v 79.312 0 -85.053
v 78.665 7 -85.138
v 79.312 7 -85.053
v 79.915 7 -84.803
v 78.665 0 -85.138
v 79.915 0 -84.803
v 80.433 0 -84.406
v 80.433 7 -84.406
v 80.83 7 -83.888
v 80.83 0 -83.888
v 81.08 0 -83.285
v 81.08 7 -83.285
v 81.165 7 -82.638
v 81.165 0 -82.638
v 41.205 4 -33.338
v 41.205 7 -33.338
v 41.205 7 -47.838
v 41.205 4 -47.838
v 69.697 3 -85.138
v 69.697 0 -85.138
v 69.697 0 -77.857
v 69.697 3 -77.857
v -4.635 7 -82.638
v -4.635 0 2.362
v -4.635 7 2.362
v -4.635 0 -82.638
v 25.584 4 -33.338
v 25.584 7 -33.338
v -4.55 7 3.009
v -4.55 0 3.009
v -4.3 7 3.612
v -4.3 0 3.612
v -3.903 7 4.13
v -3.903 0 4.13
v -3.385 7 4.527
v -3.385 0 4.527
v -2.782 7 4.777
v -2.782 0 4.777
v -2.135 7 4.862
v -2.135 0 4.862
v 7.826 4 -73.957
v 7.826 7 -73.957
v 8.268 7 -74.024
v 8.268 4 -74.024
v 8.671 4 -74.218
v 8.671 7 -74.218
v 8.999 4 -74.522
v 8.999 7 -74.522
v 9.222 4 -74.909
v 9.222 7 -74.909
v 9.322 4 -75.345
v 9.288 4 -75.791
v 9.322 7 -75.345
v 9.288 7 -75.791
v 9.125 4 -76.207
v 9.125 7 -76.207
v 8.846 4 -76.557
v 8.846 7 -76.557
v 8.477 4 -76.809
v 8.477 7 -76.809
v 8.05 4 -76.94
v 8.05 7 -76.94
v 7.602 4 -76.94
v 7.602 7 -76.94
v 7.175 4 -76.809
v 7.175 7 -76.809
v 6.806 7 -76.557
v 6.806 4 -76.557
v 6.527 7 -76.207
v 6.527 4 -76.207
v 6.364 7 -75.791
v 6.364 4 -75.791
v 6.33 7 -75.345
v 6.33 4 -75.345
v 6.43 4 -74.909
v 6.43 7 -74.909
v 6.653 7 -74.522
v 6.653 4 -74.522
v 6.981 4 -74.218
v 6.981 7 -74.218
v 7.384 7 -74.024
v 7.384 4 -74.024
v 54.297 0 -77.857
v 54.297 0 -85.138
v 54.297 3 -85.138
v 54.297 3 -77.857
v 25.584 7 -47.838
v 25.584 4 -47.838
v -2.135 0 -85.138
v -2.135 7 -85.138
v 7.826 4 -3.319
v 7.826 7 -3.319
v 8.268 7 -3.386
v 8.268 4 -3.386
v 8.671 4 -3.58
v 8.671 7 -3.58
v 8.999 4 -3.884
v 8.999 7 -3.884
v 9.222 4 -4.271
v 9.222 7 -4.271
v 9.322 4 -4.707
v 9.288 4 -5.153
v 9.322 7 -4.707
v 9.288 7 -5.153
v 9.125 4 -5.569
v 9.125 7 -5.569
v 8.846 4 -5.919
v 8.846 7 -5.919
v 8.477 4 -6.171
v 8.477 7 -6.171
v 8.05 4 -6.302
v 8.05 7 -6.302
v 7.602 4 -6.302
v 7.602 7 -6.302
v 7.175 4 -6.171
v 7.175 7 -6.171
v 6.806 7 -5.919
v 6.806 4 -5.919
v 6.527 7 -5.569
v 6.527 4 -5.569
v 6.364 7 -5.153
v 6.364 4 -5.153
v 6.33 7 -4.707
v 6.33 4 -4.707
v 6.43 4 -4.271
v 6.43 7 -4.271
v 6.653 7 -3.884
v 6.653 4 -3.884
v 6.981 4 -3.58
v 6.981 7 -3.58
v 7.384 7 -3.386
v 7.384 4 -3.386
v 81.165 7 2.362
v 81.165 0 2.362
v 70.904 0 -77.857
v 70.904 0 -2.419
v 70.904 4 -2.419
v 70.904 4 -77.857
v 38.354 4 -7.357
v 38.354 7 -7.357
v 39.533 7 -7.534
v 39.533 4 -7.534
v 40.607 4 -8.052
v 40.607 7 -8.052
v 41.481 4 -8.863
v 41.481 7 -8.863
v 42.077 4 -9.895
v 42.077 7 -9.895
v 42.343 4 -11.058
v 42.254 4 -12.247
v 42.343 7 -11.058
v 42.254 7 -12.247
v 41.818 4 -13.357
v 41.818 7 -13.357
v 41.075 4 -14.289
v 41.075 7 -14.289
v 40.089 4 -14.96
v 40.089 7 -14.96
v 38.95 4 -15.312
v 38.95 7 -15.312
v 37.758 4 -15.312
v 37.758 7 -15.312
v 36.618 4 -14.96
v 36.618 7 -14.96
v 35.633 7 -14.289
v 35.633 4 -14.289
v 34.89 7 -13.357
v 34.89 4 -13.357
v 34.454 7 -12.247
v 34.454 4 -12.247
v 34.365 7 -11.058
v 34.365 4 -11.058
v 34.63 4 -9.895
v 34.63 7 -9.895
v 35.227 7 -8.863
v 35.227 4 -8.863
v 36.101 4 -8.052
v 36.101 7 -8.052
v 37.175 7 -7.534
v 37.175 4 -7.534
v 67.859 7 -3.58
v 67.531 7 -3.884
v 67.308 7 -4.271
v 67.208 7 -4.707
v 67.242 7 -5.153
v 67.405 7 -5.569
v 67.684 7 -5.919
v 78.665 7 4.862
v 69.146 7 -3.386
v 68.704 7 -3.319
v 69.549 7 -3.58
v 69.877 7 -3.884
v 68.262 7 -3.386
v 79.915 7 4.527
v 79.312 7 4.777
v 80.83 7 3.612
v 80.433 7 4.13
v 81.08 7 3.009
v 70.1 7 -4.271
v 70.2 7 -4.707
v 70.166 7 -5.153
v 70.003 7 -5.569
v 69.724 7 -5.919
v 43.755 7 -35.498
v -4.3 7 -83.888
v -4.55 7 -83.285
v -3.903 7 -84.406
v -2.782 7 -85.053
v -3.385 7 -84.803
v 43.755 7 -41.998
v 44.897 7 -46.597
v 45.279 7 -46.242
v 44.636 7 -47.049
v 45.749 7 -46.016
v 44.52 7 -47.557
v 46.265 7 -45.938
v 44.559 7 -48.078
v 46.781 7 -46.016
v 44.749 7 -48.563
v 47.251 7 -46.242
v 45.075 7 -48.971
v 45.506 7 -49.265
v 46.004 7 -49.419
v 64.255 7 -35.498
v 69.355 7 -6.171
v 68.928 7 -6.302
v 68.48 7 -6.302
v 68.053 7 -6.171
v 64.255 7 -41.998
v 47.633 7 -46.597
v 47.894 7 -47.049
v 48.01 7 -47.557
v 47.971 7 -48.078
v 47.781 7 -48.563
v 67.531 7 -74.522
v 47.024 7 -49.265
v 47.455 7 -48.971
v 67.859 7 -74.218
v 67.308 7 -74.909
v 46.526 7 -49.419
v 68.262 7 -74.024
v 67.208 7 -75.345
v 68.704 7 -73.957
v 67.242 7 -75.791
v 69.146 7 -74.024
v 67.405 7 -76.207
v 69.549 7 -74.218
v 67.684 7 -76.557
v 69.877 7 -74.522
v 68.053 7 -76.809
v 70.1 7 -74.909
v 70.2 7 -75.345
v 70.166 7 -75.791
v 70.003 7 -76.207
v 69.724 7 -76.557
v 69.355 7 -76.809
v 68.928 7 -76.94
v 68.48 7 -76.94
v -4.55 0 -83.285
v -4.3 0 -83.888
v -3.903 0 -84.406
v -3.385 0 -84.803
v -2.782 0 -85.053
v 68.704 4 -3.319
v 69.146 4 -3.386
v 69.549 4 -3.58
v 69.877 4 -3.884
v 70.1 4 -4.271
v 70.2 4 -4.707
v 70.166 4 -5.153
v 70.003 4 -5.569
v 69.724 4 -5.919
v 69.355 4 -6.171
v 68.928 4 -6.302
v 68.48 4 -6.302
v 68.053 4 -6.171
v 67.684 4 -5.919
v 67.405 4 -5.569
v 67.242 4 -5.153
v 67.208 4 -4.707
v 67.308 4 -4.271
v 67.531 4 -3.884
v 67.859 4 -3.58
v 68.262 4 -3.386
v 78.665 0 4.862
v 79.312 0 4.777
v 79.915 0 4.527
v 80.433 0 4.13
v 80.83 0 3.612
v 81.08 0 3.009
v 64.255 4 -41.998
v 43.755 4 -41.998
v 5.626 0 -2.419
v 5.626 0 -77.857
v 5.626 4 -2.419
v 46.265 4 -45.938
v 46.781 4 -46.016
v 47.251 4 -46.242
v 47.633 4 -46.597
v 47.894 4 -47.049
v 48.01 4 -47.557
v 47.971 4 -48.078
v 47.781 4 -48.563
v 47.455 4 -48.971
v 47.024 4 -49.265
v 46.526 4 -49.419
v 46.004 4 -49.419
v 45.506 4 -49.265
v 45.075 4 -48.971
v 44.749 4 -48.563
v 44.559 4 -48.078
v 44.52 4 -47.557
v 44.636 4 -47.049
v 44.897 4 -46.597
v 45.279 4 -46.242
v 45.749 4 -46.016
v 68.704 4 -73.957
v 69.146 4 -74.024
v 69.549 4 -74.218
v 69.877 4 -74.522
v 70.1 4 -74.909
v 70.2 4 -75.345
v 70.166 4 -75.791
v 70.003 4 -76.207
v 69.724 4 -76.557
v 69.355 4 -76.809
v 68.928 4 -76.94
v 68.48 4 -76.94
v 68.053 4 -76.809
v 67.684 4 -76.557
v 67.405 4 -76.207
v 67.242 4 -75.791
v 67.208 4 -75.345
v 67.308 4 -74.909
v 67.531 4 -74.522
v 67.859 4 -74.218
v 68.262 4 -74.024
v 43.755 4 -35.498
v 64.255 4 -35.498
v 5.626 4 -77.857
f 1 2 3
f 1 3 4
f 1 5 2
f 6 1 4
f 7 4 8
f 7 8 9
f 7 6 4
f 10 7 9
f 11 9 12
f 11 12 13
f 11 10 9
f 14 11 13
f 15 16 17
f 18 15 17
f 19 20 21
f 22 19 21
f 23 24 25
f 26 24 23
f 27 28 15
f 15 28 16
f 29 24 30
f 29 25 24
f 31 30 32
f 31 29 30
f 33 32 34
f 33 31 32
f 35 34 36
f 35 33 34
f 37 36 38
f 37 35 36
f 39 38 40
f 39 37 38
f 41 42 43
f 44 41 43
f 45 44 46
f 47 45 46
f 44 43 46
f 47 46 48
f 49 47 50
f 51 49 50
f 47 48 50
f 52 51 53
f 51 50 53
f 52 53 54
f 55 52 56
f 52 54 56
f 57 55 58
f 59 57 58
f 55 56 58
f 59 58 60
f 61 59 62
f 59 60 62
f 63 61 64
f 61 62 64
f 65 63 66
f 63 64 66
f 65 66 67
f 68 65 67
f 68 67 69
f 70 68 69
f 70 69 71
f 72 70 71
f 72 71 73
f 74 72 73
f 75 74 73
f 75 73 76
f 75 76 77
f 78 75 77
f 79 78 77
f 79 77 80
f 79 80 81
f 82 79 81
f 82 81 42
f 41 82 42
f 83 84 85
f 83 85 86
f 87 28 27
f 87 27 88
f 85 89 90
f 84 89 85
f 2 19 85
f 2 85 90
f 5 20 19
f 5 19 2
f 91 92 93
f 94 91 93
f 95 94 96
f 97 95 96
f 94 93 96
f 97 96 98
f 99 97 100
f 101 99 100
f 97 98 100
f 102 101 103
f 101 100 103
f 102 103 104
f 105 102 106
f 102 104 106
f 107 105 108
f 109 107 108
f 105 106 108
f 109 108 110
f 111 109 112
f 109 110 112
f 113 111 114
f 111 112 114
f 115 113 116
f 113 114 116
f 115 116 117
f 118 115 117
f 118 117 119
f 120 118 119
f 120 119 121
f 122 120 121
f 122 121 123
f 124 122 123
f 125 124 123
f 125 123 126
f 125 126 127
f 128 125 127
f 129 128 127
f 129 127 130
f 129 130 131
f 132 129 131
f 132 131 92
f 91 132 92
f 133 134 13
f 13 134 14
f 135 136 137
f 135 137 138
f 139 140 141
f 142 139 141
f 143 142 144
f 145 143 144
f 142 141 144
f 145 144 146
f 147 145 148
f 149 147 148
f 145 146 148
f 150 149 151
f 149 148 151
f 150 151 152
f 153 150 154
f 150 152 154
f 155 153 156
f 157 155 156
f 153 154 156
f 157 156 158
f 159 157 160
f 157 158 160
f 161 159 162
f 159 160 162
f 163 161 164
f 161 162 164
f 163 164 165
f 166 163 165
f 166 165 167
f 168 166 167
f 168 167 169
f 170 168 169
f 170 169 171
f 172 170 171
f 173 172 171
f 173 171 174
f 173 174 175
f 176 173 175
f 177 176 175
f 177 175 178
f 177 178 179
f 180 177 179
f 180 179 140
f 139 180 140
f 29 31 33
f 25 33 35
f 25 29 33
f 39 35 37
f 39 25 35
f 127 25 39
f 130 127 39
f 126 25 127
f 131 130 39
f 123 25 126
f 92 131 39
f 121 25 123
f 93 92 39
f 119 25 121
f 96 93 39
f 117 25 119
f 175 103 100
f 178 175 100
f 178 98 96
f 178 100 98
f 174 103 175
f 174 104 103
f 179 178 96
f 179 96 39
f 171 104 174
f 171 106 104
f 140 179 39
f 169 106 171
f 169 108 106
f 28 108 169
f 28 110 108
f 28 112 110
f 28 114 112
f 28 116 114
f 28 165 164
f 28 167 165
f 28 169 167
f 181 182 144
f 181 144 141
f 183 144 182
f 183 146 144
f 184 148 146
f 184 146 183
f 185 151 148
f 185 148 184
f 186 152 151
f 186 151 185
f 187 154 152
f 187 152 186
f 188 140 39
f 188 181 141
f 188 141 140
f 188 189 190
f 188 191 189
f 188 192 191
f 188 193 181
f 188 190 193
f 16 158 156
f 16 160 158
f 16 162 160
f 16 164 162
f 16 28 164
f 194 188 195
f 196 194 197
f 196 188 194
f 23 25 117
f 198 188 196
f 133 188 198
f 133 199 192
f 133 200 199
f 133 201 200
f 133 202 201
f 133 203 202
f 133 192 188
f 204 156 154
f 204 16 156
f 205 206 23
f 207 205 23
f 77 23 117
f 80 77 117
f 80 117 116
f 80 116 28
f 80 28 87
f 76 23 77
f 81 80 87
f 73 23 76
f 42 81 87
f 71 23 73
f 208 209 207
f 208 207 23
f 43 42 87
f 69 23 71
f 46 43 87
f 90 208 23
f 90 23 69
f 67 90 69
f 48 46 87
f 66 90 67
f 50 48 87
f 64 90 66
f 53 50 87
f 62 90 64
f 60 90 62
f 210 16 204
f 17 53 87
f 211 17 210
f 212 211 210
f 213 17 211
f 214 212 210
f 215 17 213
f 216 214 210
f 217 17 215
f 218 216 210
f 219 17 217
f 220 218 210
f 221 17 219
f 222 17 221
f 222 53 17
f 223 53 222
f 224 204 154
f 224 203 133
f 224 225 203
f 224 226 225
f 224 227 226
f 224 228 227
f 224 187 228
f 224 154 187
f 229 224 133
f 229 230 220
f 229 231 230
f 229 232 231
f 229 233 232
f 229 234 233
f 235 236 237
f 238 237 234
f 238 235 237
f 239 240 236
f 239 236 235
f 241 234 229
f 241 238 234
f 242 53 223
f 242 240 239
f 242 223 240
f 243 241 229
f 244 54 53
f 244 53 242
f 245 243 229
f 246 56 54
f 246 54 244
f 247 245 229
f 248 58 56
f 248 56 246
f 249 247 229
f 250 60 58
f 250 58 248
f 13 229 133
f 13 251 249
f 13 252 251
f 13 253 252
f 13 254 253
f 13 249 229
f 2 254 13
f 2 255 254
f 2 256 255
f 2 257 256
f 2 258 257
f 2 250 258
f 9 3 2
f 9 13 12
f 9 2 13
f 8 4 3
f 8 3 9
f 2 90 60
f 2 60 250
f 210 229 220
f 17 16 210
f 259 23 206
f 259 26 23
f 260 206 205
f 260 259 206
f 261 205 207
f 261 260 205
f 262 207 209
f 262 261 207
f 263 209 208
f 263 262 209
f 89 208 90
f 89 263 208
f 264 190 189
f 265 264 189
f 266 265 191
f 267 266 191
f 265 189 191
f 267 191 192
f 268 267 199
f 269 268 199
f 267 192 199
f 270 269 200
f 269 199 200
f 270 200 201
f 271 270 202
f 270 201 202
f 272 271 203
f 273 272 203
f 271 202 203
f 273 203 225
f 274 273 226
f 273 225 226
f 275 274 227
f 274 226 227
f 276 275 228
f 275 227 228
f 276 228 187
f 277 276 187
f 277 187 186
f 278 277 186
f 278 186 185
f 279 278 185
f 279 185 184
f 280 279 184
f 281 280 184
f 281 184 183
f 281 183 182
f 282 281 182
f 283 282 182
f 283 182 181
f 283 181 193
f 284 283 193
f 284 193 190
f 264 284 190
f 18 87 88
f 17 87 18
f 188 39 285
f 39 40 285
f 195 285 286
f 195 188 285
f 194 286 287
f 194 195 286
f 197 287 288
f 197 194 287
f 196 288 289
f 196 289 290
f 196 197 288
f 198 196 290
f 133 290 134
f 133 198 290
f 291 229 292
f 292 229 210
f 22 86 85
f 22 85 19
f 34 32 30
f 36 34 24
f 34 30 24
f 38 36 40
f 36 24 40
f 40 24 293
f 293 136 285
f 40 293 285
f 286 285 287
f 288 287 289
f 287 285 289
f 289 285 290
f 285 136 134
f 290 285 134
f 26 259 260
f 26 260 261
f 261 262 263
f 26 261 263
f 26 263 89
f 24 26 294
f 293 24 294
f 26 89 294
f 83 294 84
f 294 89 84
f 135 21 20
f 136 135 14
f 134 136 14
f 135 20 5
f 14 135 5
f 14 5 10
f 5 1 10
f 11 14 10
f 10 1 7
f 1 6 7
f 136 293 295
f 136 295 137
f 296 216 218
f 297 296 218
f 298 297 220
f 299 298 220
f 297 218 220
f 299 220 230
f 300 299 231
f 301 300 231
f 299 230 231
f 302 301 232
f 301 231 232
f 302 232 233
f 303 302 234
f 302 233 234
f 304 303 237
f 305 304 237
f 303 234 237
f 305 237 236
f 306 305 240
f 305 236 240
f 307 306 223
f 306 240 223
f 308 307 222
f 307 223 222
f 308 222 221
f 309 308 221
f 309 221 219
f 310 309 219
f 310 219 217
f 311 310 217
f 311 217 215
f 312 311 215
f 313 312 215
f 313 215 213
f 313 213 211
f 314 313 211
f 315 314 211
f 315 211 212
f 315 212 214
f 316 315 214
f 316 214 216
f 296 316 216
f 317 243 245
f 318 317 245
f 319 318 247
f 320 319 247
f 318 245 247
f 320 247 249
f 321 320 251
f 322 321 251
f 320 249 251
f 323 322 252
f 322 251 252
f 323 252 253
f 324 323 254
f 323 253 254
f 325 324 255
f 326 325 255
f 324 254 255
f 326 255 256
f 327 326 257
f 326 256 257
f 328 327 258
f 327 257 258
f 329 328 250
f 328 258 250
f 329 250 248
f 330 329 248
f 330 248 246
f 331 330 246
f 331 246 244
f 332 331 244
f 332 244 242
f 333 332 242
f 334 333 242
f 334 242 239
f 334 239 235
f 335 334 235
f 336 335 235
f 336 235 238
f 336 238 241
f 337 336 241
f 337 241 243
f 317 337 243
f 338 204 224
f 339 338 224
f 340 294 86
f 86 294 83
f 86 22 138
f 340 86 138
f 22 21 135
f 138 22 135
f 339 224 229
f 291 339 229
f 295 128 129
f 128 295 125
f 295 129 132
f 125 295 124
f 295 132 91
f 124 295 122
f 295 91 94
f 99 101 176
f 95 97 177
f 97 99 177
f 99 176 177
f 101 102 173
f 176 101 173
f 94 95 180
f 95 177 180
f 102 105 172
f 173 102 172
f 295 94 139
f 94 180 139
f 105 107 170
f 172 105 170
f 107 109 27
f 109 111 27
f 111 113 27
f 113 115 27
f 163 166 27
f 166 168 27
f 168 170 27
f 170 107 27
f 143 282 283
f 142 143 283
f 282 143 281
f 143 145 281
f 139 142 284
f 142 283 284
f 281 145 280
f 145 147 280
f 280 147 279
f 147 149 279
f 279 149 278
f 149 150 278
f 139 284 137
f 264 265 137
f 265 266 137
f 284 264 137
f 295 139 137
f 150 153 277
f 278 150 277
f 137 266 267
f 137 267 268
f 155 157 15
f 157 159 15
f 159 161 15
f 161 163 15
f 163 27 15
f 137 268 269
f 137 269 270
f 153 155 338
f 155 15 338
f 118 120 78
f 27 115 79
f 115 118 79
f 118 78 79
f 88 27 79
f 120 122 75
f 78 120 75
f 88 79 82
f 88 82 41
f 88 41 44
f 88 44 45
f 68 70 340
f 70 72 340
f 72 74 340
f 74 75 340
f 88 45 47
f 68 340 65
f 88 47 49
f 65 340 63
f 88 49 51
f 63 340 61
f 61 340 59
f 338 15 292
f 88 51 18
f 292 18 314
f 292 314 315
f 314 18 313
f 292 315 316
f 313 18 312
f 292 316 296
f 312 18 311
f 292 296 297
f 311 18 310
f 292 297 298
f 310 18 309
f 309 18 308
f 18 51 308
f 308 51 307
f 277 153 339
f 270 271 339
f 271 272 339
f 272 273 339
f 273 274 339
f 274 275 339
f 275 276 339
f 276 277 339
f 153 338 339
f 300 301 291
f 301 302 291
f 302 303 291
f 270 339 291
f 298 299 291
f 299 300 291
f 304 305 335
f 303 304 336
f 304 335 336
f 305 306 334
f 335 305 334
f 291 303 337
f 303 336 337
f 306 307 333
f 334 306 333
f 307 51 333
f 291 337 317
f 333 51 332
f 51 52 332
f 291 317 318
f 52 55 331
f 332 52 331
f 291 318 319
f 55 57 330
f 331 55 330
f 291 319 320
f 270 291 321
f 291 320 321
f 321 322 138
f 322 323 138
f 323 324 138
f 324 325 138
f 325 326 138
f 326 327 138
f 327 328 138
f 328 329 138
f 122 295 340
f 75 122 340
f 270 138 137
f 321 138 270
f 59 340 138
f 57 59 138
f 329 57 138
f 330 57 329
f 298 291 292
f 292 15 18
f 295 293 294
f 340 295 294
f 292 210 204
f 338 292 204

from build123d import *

# Parameters (mm, degrees)
SKETCH_1_W           = 85.8
SKETCH_1_H           = 90
SKETCH_1_W_2         = 65.278
SKETCH_1_H_2         = 75.438
EXTRUDE_1_DEPTH      = 4
SKETCH_6_W           = 85.8
SKETCH_6_H           = 90
EXTRUDE_2_DEPTH      = 3
SKETCH_7_W           = 15.4
SKETCH_7_H           = 7.281
CUT_EXTRUDE_1_DEPTH  = 3
FILLET_1_R           = 2.5
CUT_EXTRUDE_2_DEPTH  = 118.835684599
SKETCH_10_R          = 1.75
CUT_EXTRUDE_3_DEPTH  = 118.835684599
SKETCH_11_W          = 15.621
SKETCH_11_H          = 14.5
CUT_EXTRUDE_4_DEPTH  = 118.835684599
SKETCH_15_R          = 4
CUT_EXTRUDE_8_DEPTH  = 118.835684599
SKETCH_12_R          = 1.5
CUT_EXTRUDE_15_DEPTH = 10


with BuildPart() as part:
    # 草图1 → 凸台-拉伸1 (new body)
    with BuildSketch(Plane(origin=(0, 0, 0), x_dir=(1, 0, 0), z_dir=(0, 1, 0))):
        with Locations((38.264980184, 40.138091102)):
            Rectangle(SKETCH_1_W, SKETCH_1_H)
        with Locations((38.264980184, 40.138091102)):
            Rectangle(SKETCH_1_W_2, SKETCH_1_H_2, mode=Mode.SUBTRACT)
    extrude(amount=EXTRUDE_1_DEPTH)

    # 草图6 → 凸台-拉伸2 (add)
    with BuildSketch(Plane(origin=(0, 4, 0), x_dir=(1, 0, 0), z_dir=(0, 1, 0))):
        with Locations((38.264980184, 40.138091102)):
            Rectangle(SKETCH_6_W, SKETCH_6_H)
    extrude(amount=EXTRUDE_2_DEPTH)

    # 草图7 → 切除-拉伸1 (cut)
    with BuildSketch(Plane.XZ):
        with Locations((61.997000004, -81.497591102)):
            Rectangle(SKETCH_7_W, SKETCH_7_H)
    extrude(amount=-CUT_EXTRUDE_1_DEPTH, mode=Mode.SUBTRACT)

    # 圆角1
    fillet_1_edges = [part.edges().sort_by_distance(p)[0] for p in [
        (-4.635019816, 3.5, -85.138091102),
        (81.164980184, 3.5, -85.138091102),
        (81.164980184, 3.5, 4.861908898),
        (-4.635019816, 3.5, 4.861908898),
    ]]
    fillet(fillet_1_edges, radius=FILLET_1_R)

    # 草图9 → 切除-拉伸2 (cut, through all)
    with BuildSketch(Plane(origin=(0, 7, 0), x_dir=(1, 0, 0), z_dir=(0, 1, 0))):
        Polygon((64.254980184, 41.998091102), (47.299239867, 41.998091102), (43.754980184, 41.998091102), (43.754980184, 35.498091102), (64.254980184, 35.498091102), align=None)
    extrude(amount=-CUT_EXTRUDE_2_DEPTH, mode=Mode.SUBTRACT)

    # 草图10 → 切除-拉伸3 (cut, through all)
    with BuildSketch(Plane(origin=(0, 7, 0), x_dir=(1, 0, 0), z_dir=(0, 1, 0))):
        with Locations(Location((46.264980184, 47.688091102, 0), (0, 0, 270))):
            Circle(SKETCH_10_R)
    extrude(amount=-CUT_EXTRUDE_3_DEPTH, mode=Mode.SUBTRACT)

    # 草图11 → 切除-拉伸4 (cut, through all)
    with BuildSketch(Plane(origin=(0, 7, 0), x_dir=(1, 0, 0), z_dir=(0, 1, 0))):
        with Locations((33.394480184, 40.588091102)):
            Rectangle(SKETCH_11_W, SKETCH_11_H)
    extrude(amount=-CUT_EXTRUDE_4_DEPTH, mode=Mode.SUBTRACT)

    # 草图15 → 切除-拉伸8 (cut, through all)
    with BuildSketch(Plane(origin=(0, 7, 0), x_dir=(1, 0, 0), z_dir=(0, 1, 0))):
        with Locations(Location((38.353887366, 11.356570823, 0), (0, 0, 270))):
            Circle(SKETCH_15_R)
    extrude(amount=-CUT_EXTRUDE_8_DEPTH, mode=Mode.SUBTRACT)

    # 草图12 → 切除-拉伸15 (cut)
    with BuildSketch(Plane(origin=(0, 7, 0), x_dir=(1, 0, 0), z_dir=(0, 1, 0))):
        with Locations(Location((7.825980184, 75.457091102, 0), (0, 0, 270))):
            Circle(SKETCH_12_R)
        with Locations(Location((68.703980184, 75.457091102, 0), (0, 0, 270))):
            Circle(SKETCH_12_R)
        with Locations(Location((7.825980184, 4.819091102, 0), (0, 0, 270))):
            Circle(SKETCH_12_R)
        with Locations(Location((68.703980184, 4.819091102, 0), (0, 0, 270))):
            Circle(SKETCH_12_R)
    extrude(amount=-CUT_EXTRUDE_15_DEPTH, mode=Mode.SUBTRACT)


solid = part.part
